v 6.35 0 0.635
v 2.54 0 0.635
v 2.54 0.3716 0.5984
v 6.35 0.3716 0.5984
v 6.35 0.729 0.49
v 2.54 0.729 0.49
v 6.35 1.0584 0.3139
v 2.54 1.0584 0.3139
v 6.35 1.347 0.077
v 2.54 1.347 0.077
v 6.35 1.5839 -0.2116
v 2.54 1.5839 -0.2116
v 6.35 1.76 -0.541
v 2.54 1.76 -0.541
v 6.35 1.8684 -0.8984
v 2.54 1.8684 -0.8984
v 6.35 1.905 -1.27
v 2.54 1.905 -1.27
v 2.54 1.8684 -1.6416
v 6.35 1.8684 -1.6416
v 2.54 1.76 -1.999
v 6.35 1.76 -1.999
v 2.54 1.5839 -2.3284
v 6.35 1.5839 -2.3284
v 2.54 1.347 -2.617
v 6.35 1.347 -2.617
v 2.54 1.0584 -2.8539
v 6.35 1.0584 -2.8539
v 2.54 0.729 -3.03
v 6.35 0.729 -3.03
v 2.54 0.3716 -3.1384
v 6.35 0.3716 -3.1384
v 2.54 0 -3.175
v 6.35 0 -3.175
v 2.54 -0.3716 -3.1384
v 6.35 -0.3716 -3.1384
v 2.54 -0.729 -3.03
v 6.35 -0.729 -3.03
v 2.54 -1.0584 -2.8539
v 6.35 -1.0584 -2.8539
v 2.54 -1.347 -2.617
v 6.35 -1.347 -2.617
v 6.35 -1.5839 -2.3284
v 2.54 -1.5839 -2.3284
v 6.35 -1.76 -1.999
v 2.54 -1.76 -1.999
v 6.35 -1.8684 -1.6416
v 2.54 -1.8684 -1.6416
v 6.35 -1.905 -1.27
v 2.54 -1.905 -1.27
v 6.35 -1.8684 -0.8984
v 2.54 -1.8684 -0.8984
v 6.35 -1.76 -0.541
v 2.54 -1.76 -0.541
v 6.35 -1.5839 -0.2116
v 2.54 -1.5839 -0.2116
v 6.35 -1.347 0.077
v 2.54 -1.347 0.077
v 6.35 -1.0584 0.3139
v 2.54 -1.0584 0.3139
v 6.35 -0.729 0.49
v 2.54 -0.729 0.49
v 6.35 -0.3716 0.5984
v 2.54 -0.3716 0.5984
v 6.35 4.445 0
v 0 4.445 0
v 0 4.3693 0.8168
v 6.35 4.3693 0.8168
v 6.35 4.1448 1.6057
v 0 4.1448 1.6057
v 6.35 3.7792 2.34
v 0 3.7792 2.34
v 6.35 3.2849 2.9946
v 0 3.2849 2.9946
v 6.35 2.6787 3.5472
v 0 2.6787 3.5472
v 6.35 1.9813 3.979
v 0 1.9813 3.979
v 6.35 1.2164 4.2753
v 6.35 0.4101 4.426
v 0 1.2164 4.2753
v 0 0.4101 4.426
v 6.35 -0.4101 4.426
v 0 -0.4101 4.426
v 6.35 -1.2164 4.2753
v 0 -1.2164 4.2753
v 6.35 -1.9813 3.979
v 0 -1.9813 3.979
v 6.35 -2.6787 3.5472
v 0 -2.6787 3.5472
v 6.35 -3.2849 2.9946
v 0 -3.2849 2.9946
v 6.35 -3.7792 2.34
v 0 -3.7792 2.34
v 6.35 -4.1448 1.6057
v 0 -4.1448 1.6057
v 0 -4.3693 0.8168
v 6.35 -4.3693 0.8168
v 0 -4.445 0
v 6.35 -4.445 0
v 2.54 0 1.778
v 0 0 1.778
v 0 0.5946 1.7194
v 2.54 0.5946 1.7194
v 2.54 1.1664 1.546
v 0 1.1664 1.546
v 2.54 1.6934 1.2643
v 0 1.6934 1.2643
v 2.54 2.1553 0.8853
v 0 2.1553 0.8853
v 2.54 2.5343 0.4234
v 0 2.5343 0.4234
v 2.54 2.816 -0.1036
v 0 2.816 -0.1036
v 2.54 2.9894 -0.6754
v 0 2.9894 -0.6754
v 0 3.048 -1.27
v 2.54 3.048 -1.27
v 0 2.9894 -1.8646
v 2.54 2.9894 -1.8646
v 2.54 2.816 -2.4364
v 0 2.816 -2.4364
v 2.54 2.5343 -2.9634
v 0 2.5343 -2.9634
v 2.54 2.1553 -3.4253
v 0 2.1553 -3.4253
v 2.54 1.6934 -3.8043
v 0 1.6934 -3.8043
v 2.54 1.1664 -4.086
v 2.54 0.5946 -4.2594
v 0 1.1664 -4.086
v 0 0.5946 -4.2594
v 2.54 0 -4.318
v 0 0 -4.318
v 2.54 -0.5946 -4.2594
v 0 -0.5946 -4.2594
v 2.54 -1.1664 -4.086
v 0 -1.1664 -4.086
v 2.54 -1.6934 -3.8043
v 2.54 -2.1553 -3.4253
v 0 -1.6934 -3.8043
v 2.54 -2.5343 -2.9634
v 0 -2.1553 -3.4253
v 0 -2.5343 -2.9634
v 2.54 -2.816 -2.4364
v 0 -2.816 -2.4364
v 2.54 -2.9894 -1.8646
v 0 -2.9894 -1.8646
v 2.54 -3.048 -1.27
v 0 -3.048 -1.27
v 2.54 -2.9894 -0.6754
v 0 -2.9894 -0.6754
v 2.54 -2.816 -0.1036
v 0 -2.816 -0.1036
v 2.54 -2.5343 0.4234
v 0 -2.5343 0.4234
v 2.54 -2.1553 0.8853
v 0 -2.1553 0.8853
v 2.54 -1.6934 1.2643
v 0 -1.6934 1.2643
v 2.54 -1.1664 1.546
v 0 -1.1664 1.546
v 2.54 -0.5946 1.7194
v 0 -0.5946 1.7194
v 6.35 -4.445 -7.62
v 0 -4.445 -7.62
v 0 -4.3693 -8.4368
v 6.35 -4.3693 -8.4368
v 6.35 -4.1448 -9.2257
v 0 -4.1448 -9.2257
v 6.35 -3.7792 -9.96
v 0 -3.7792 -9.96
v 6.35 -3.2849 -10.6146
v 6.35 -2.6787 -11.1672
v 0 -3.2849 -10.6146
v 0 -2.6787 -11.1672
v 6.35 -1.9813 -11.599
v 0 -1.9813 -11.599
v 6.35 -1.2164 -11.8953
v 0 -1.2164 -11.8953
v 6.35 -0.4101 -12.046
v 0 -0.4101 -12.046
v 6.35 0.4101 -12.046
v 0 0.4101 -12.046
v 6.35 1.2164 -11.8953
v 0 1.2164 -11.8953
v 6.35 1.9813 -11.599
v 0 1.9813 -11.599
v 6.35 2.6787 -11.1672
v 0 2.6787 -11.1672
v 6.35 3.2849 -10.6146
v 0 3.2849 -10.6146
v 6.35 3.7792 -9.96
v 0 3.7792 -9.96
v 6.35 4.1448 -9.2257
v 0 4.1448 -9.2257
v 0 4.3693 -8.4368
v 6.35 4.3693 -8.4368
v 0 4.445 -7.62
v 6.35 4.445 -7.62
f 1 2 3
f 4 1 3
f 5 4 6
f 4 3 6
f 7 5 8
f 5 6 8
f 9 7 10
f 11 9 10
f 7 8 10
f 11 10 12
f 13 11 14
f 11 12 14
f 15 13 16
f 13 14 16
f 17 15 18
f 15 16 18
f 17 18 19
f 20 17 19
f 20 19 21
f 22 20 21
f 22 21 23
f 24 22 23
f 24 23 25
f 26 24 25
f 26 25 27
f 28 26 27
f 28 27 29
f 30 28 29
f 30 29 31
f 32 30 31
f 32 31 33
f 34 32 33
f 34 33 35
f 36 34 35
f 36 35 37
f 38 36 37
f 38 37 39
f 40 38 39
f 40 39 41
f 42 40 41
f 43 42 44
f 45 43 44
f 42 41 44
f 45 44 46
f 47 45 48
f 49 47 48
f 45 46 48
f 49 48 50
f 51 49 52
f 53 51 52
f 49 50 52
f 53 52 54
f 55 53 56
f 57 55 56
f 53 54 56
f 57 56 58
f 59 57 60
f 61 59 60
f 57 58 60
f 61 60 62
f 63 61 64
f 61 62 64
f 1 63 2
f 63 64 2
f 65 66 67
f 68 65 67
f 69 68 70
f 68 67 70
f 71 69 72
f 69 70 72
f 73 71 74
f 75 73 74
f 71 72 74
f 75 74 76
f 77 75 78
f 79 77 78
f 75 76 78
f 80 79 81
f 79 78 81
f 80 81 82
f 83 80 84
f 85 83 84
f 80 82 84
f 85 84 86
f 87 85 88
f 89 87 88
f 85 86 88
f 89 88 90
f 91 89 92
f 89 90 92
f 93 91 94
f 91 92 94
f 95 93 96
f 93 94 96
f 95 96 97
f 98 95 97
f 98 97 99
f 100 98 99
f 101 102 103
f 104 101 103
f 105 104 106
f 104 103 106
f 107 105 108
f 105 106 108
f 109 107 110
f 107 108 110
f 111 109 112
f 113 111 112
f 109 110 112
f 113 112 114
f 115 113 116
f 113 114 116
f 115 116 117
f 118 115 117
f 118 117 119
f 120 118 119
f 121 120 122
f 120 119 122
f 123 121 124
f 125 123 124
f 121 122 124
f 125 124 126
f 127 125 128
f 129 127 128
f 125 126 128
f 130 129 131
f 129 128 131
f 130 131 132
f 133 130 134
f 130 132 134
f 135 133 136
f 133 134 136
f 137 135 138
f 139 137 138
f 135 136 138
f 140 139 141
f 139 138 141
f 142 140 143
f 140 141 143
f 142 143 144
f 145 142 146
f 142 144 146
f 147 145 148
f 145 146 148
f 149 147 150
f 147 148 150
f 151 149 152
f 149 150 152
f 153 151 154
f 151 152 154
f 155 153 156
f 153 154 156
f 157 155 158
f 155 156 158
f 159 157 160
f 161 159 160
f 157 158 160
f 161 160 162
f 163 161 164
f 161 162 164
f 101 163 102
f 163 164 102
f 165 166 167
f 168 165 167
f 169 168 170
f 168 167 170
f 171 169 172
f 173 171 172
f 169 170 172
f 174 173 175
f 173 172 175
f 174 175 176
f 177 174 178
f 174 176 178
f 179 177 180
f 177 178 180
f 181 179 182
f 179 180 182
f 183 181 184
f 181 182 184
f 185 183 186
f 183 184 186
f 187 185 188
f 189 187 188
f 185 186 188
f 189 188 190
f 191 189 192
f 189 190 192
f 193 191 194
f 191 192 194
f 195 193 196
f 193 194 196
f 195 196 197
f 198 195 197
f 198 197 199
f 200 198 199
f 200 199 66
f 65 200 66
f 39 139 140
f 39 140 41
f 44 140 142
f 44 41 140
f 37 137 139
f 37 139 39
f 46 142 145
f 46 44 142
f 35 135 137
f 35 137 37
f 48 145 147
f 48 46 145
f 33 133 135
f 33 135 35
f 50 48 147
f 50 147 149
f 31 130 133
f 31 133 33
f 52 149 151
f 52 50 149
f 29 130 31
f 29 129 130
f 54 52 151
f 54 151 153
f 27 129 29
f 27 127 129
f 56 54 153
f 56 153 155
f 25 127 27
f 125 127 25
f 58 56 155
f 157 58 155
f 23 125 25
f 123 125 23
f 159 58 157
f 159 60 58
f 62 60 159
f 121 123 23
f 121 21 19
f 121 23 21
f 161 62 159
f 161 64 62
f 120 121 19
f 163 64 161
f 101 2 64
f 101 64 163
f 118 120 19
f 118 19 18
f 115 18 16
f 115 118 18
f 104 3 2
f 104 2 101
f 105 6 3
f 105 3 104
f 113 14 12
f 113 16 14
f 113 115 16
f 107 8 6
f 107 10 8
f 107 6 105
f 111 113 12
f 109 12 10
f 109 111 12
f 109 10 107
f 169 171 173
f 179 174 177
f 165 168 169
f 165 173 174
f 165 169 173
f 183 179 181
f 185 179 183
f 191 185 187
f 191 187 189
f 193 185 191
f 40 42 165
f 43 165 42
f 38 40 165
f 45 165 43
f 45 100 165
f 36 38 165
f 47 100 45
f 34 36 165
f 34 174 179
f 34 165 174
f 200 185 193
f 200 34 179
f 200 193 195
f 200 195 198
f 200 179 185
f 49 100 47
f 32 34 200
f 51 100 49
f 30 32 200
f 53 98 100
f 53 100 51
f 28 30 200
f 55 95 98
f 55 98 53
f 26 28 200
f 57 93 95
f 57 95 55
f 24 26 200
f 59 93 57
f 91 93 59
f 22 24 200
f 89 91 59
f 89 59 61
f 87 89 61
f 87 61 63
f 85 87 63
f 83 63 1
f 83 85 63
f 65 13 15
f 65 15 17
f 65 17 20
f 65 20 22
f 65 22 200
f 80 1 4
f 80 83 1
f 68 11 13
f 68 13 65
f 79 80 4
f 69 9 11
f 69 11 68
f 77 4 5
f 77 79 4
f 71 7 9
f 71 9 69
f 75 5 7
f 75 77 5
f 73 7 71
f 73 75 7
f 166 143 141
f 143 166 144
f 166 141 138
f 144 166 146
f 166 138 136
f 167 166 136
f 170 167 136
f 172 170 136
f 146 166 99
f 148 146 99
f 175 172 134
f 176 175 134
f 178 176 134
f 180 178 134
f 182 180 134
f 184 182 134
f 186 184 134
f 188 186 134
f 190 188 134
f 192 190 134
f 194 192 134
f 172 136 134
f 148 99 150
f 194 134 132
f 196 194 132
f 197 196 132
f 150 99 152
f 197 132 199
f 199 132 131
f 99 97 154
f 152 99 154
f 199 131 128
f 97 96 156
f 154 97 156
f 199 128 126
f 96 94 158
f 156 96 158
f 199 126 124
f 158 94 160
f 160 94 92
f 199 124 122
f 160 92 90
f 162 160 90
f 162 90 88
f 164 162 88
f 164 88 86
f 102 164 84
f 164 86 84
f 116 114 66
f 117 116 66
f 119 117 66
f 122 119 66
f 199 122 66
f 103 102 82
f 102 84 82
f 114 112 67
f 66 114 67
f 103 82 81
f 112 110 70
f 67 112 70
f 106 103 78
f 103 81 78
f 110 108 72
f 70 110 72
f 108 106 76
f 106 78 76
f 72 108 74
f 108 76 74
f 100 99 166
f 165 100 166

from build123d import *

# Parameters (mm, degrees)
SKETCH1_R           = 1.905
BOSS_EXTRUDE1_DEPTH = 6.35
BOSS_EXTRUDE2_START = -6.35
BOSS_EXTRUDE2_DEPTH = 6.35
BOSS_EXTRUDE4_START = -6.35
SKETCH6_R           = 1.905
BOSS_EXTRUDE4_DEPTH = 6.35
SKETCH7_R           = 1.905
CUT_EXTRUDE3_DEPTH  = 15.340319034
SKETCH8_R           = 3.048
CUT_EXTRUDE4_DEPTH  = 2.54


with BuildPart() as part:
    # Sketch1 → Boss-Extrude1 (new body)
    with BuildSketch(Plane.YZ):
        with BuildLine():
            Line((-3.175, 0), (-3.175, -7.62))
            ThreePointArc((-3.175, -7.62), (0, -10.795), (3.175, -7.62))
            Line((3.175, -7.62), (3.175, 0))
            ThreePointArc((3.175, 0), (0, 3.175), (-3.175, 0))
        make_face()
        with Locations(Location((0, 0, 0), (0, 0, 270))):
            Circle(SKETCH1_R, mode=Mode.SUBTRACT)
    extrude(amount=BOSS_EXTRUDE1_DEPTH)

    # Sketch2 → Boss-Extrude2 (add)
    with BuildSketch(Plane.YZ.offset(6.35).offset(BOSS_EXTRUDE2_START)):
        with BuildLine():
            Line((4.445, -7.62), (4.445, 0))
            ThreePointArc((4.445, 0), (0, 4.445), (-4.445, 0))
            Line((-4.445, 0), (-4.445, -7.62))
            ThreePointArc((-4.445, -7.62), (0, -12.065), (4.445, -7.62))
        make_face()
        with BuildLine():
            ThreePointArc((3.175, 0), (0, 3.175), (-3.175, 0))
            Line((-3.175, 0), (-3.175, -7.62))
            ThreePointArc((-3.175, -7.62), (0, -10.795), (3.175, -7.62))
            Line((3.175, -7.62), (3.175, 0))
        make_face(mode=Mode.SUBTRACT)
    extrude(amount=BOSS_EXTRUDE2_DEPTH)

    # Sketch6 → Boss-Extrude4 (add)
    with BuildSketch(Plane.YZ.offset(6.35).offset(BOSS_EXTRUDE4_START)):
        Circle(SKETCH6_R)
    extrude(amount=BOSS_EXTRUDE4_DEPTH)

    # Sketch7 → Cut-Extrude3 (cut, through all)
    with BuildSketch(Plane(origin=(0, 0, 0), x_dir=(0, -1, 0), z_dir=(-1, 0, 0))):
        with Locations(Location((0, -1.27, 0), (0, 0, 90))):
            Circle(SKETCH7_R)
    extrude(amount=-CUT_EXTRUDE3_DEPTH, mode=Mode.SUBTRACT)

    # Sketch8 → Cut-Extrude4 (cut)
    with BuildSketch(Plane(origin=(0, 0, 0), x_dir=(0, -1, 0), z_dir=(-1, 0, 0))):
        with Locations(Location((0, -1.27, 0), (0, 0, 90))):
            Circle(SKETCH8_R)
    extrude(amount=-CUT_EXTRUDE4_DEPTH, mode=Mode.SUBTRACT)


solid = part.part
